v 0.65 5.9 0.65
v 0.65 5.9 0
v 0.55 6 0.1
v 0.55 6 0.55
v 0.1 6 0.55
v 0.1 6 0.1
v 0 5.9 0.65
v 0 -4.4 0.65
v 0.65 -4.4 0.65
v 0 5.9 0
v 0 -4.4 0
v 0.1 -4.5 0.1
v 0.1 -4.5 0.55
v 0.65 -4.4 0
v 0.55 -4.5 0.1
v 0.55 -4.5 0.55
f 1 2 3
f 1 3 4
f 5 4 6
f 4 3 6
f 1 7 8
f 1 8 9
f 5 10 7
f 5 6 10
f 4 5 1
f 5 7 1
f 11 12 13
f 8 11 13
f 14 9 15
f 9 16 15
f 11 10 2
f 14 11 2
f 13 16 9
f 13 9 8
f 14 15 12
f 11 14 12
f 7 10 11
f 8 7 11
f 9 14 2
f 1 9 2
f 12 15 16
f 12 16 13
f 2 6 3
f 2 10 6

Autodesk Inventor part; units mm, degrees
ref_plane "YZ Plane" through (0, 0, 0) normal (1, 0, 0) x (0, 1, 0)
ref_plane "XZ Plane" through (0, 0, 0) normal (0, 1, 0) x (-1, 0, 0)
ref_plane "XY Plane" through (0, 0, 0) normal (0, 0, 1) x (1, 0, 0)
sketch "Sketch3" plane through (0, 0, 0) normal (0, 0, 1) x (1, 0, 0)
  line L0 (0, 0) -> (0.65, 0)
  line L1 (0.65, 0) -> (0.65, 6)
  line L2 (0.65, 6) -> (0, 6)
  line L3 (0, 6) -> (0, 0)
  line L4 (0.325, 0) -> (2.865, 0)
  line L5 (0, 0) -> (0.65, 0)
  line L6 (0.65, 0) -> (0.65, -4.5)
  line L7 (0.65, -4.5) -> (0, -4.5)
  line L8 (0, -4.5) -> (0, 0)
  dimension "d0" = 0.65
  dimension "d1" = 6
  dimension "d3" = 4.5
extrude "Extrusion1" add sketch "Sketch3" along normal blind 0.65
chamfer "Chamfer1" distance 0.1 angle 45 8 edges at (0.65, 6, 0.325) (0.325, 6, 0.65) (0, 6, 0.325) (0.325, 6, 0) (0.65, -4.5, 0.325) (0.325, -4.5, 0.65) (0, -4.5, 0.325) (0.325, -4.5, 0)
properties part number "Pin" material "Silver"
